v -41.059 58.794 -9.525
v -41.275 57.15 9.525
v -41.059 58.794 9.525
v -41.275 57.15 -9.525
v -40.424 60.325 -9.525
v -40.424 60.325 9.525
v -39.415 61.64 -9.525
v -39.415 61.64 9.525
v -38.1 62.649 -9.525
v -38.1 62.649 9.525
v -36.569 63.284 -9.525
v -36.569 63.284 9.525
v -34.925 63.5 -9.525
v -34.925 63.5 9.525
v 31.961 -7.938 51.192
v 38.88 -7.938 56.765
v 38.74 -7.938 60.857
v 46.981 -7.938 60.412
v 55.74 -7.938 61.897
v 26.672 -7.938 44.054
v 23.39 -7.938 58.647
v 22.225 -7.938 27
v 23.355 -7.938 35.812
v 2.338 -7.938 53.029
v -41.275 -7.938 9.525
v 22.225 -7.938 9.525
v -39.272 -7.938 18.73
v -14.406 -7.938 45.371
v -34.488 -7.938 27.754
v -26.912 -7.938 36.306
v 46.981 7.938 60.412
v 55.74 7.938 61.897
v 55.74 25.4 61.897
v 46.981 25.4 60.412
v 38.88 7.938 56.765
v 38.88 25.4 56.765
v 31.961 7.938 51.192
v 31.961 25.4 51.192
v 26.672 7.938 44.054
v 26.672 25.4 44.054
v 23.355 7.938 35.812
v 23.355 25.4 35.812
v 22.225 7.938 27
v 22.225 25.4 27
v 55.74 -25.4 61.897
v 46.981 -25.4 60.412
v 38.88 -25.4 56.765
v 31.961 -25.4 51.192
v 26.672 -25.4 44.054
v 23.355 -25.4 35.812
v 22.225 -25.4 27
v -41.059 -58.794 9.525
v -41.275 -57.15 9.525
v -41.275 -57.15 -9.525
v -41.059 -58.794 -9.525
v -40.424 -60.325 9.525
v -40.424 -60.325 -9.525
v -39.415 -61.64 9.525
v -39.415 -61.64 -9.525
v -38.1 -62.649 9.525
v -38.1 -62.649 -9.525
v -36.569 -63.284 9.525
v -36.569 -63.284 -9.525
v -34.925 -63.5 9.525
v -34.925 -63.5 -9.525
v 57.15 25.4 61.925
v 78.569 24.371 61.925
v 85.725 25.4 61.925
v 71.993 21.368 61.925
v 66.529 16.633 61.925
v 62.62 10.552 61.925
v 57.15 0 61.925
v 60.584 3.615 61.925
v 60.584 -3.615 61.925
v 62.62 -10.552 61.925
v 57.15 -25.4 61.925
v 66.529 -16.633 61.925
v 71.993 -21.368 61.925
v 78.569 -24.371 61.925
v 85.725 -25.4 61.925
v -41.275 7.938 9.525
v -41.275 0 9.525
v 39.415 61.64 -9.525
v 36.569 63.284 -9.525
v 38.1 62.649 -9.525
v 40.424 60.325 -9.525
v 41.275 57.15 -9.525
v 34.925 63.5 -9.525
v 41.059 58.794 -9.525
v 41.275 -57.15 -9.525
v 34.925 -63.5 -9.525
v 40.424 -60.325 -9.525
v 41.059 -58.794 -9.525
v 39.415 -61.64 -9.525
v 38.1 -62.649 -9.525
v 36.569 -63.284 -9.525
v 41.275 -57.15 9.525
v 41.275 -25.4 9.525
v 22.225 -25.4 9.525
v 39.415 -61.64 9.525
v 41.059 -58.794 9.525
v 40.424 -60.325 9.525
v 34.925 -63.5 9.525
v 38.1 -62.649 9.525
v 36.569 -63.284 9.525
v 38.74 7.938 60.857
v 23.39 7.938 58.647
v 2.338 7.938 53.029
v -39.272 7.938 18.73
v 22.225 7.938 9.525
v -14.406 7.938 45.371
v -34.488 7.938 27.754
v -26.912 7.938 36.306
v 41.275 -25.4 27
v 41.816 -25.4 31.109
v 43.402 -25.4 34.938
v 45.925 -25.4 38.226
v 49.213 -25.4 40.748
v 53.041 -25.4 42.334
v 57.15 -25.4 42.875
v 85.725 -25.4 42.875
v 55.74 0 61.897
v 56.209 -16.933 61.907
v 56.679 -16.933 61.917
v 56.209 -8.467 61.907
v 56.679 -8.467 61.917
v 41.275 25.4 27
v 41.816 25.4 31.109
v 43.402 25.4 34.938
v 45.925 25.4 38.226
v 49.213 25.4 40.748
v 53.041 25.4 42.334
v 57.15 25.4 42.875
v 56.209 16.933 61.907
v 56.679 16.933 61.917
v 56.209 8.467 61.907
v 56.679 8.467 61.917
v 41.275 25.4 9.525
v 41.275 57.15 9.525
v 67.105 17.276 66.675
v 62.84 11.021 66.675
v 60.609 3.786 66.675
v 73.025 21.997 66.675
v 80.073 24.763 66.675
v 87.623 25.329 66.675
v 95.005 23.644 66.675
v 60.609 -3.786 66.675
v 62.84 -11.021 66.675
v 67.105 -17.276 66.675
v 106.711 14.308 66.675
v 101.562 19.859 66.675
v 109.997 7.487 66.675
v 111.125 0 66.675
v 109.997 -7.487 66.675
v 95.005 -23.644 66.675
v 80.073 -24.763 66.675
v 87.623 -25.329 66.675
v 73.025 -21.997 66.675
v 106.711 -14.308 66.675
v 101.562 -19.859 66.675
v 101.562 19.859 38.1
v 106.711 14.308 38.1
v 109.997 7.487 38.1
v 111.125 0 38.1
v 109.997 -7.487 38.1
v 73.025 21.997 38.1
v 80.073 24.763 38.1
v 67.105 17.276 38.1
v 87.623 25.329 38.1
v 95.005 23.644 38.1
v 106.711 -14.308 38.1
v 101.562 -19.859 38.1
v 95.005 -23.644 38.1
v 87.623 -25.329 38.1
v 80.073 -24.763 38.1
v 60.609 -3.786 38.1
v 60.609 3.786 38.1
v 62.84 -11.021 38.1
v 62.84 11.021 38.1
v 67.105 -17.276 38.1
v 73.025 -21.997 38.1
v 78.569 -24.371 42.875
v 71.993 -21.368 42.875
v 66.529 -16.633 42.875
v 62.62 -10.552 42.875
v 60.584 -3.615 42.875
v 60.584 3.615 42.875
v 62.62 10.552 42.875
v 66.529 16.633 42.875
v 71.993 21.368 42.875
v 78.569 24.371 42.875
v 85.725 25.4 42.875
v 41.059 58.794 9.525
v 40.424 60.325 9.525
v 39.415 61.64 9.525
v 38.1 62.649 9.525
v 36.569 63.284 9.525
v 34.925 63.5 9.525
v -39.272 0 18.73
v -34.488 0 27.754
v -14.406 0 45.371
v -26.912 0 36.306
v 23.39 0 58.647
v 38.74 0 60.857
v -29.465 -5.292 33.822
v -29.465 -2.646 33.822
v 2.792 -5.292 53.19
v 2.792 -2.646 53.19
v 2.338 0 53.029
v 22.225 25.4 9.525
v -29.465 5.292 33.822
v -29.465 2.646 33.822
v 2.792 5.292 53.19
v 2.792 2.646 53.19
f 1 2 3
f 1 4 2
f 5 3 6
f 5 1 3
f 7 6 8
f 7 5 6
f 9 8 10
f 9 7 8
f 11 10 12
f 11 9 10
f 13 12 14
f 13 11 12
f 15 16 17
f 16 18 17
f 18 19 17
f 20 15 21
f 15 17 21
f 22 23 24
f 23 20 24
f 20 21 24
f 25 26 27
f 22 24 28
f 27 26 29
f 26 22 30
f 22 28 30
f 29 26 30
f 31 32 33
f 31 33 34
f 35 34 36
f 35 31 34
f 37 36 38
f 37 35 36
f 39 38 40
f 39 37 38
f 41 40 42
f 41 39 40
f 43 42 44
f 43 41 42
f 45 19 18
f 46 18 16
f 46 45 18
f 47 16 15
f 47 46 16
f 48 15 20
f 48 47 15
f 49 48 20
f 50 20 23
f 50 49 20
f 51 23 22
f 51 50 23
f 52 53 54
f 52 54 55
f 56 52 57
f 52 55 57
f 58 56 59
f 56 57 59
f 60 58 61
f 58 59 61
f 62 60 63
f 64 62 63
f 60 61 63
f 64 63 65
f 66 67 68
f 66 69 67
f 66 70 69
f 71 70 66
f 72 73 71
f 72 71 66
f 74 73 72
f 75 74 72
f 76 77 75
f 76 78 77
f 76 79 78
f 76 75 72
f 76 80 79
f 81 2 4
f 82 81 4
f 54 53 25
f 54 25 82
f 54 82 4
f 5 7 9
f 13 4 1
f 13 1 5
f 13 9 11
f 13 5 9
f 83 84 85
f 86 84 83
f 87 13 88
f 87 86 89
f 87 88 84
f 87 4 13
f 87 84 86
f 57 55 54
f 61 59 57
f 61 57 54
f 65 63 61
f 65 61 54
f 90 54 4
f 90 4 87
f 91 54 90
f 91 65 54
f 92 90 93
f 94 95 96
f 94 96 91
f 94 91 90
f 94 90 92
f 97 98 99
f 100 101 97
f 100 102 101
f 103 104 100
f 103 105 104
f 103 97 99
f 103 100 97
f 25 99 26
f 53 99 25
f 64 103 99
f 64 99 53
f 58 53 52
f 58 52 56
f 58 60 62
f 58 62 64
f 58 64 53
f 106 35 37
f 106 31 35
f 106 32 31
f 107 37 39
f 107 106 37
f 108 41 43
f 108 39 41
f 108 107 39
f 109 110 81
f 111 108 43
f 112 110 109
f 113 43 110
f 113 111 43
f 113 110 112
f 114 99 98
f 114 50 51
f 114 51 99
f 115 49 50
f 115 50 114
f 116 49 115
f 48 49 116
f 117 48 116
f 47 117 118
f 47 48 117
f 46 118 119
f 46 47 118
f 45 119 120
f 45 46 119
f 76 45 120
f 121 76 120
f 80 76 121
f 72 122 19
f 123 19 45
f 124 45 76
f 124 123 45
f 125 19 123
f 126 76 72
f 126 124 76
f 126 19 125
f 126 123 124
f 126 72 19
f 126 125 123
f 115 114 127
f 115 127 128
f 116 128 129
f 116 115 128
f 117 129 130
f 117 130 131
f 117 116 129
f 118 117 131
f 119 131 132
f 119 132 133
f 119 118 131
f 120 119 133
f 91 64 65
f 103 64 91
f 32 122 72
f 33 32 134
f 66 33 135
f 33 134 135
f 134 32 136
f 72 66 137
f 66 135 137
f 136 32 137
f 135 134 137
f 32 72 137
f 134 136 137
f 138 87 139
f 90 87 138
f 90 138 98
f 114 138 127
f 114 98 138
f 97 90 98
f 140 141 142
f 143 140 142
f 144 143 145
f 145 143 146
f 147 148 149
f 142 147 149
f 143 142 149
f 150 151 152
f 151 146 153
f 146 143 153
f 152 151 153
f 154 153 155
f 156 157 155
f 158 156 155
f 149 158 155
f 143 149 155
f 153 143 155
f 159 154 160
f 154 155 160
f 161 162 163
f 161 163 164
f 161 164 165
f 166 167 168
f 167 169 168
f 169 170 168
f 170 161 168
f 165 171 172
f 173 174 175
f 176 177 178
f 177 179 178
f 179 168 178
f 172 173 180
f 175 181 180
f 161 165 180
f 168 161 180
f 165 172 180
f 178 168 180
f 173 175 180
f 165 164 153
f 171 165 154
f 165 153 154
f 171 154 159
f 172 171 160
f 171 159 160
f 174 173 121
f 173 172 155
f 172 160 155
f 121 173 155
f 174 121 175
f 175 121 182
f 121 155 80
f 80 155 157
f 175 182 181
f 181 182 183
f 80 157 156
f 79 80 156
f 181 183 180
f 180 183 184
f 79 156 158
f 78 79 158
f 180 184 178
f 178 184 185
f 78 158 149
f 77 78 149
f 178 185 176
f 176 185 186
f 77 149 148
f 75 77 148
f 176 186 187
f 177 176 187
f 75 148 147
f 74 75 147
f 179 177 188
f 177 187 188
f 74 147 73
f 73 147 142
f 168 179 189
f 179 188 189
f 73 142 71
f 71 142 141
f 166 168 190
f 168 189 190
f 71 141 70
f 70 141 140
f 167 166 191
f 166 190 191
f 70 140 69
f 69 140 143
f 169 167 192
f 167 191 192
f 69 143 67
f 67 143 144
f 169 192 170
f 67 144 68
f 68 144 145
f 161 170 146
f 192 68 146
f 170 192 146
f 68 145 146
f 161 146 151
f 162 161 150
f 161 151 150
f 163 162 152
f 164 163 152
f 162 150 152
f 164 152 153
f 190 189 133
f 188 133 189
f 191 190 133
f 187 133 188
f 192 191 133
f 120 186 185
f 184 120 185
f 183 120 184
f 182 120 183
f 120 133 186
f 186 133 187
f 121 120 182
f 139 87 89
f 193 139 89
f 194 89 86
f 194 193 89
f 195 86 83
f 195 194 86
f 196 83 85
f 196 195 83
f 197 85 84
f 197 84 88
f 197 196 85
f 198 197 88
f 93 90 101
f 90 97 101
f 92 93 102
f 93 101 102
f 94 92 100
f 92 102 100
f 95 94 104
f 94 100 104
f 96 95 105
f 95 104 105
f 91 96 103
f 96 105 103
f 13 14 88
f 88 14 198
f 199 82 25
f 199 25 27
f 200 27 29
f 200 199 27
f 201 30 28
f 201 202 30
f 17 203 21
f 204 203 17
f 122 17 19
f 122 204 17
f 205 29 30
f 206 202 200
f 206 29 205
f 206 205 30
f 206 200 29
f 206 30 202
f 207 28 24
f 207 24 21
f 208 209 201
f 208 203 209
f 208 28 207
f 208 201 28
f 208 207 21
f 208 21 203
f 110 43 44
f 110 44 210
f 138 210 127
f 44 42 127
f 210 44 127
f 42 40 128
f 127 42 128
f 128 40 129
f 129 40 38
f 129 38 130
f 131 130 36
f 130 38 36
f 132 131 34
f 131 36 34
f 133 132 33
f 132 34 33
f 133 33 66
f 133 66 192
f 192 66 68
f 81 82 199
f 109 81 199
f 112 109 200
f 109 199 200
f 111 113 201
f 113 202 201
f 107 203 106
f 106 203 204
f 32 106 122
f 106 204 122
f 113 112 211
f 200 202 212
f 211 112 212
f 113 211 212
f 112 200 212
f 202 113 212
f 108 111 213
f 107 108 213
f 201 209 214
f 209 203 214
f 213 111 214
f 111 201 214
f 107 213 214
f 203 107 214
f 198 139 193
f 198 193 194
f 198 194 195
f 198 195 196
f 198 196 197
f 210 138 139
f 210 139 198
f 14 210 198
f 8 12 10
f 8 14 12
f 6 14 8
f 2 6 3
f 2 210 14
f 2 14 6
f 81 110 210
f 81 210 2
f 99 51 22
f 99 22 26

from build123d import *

# Parameters (mm, degrees)
F1_DEPTH = 63.5
F2_DEPTH = 7.9375
F0_W     = 25.4
F0_H     = 19.05
F3_DEPTH = 25.4
F5_R     = 6.35


with BuildPart() as f1:
    # F0 (on Front) → F1 (new body, symmetric)
    with BuildSketch(Plane.XZ):
        Polygon((-41.275, 9.525), (-41.275, -9.525), (41.275, -9.525), (41.275, 9.525), (22.225, 9.525), align=None)
    extrude(amount=F1_DEPTH, both=True)

    # F0 (on Front) → F2 (join, symmetric)
    with BuildSketch(Plane.XZ):
        with BuildLine():
            add(Edge.make_bspline(
                [(-41.275, 9.525), (-39.6070504459, 34.3761578761), (-7.6353036908, 60.4303854768), (55.7402997063, 61.8967380816)],
                knots=[0, 0, 0, 0, 110.6868392029, 110.6868392029, 110.6868392029, 110.6868392029], degree=3))
            Line((-41.275, 9.525), (22.225, 9.525))
            Line((22.225, 9.525), (22.225, 27.0002))
            ThreePointArc((22.225, 27.0002), (31.9608216911, 51.1923665239), (55.7402997063, 61.8967380816))
        make_face()
    extrude(amount=F2_DEPTH, both=True)

    # F0 (on Front) → F3 (join, symmetric)
    with BuildSketch(Plane.XZ):
        with BuildLine():
            Line((22.225, 9.525), (41.275, 9.525))
            Line((41.275, 9.525), (41.275, 27.0002))
            ThreePointArc((41.275, 27.0002), (45.9246798487, 38.2255201513), (57.15, 42.8752))
            Line((57.15, 42.8752), (60.325, 42.8752))
            Line((60.325, 42.8752), (60.325, 61.9252))
            Line((60.325, 61.9252), (57.15, 61.9252))
            add(Edge.make_bspline(
                [(55.7402997063, 61.8967380816), (56.2084857946, 61.9075707341), (56.6783857447, 61.9170615063), (57.15, 61.9252)],
                knots=[110.6868392029, 110.6868392029, 110.6868392029, 110.6868392029, 111.5045361635, 111.5045361635, 111.5045361635, 111.5045361635], degree=3))
            ThreePointArc((55.7402997063, 61.8967380816), (31.9608216911, 51.1923665239), (22.225, 27.0002))
            Line((22.225, 27.0002), (22.225, 9.525))
        make_face()
        with Locations((73.025, 52.4002)):
            Rectangle(F0_W, F0_H)
    extrude(amount=F3_DEPTH, both=True)

    # F0 (on Front) → F4 (revolve)
    with BuildSketch(Plane.XZ):
        Polygon((85.725, 66.675), (85.725, 61.9252), (85.725, 42.8752), (85.725, 38.1), (111.125, 38.1), (111.125, 66.675), align=None)
    revolve(axis=Axis((85.725, 0, 52.3875), (0, 0, -1)))

    # F5
    f5_edges = [f1.edges().sort_by_distance(p)[0] for p in [
        (41.275, -63.5, 0),
        (-41.275, -63.5, 0),
        (41.275, 63.5, 0),
        (-41.275, 63.5, 0),
    ]]
    fillet(f5_edges, radius=F5_R)


solid = f1.part
